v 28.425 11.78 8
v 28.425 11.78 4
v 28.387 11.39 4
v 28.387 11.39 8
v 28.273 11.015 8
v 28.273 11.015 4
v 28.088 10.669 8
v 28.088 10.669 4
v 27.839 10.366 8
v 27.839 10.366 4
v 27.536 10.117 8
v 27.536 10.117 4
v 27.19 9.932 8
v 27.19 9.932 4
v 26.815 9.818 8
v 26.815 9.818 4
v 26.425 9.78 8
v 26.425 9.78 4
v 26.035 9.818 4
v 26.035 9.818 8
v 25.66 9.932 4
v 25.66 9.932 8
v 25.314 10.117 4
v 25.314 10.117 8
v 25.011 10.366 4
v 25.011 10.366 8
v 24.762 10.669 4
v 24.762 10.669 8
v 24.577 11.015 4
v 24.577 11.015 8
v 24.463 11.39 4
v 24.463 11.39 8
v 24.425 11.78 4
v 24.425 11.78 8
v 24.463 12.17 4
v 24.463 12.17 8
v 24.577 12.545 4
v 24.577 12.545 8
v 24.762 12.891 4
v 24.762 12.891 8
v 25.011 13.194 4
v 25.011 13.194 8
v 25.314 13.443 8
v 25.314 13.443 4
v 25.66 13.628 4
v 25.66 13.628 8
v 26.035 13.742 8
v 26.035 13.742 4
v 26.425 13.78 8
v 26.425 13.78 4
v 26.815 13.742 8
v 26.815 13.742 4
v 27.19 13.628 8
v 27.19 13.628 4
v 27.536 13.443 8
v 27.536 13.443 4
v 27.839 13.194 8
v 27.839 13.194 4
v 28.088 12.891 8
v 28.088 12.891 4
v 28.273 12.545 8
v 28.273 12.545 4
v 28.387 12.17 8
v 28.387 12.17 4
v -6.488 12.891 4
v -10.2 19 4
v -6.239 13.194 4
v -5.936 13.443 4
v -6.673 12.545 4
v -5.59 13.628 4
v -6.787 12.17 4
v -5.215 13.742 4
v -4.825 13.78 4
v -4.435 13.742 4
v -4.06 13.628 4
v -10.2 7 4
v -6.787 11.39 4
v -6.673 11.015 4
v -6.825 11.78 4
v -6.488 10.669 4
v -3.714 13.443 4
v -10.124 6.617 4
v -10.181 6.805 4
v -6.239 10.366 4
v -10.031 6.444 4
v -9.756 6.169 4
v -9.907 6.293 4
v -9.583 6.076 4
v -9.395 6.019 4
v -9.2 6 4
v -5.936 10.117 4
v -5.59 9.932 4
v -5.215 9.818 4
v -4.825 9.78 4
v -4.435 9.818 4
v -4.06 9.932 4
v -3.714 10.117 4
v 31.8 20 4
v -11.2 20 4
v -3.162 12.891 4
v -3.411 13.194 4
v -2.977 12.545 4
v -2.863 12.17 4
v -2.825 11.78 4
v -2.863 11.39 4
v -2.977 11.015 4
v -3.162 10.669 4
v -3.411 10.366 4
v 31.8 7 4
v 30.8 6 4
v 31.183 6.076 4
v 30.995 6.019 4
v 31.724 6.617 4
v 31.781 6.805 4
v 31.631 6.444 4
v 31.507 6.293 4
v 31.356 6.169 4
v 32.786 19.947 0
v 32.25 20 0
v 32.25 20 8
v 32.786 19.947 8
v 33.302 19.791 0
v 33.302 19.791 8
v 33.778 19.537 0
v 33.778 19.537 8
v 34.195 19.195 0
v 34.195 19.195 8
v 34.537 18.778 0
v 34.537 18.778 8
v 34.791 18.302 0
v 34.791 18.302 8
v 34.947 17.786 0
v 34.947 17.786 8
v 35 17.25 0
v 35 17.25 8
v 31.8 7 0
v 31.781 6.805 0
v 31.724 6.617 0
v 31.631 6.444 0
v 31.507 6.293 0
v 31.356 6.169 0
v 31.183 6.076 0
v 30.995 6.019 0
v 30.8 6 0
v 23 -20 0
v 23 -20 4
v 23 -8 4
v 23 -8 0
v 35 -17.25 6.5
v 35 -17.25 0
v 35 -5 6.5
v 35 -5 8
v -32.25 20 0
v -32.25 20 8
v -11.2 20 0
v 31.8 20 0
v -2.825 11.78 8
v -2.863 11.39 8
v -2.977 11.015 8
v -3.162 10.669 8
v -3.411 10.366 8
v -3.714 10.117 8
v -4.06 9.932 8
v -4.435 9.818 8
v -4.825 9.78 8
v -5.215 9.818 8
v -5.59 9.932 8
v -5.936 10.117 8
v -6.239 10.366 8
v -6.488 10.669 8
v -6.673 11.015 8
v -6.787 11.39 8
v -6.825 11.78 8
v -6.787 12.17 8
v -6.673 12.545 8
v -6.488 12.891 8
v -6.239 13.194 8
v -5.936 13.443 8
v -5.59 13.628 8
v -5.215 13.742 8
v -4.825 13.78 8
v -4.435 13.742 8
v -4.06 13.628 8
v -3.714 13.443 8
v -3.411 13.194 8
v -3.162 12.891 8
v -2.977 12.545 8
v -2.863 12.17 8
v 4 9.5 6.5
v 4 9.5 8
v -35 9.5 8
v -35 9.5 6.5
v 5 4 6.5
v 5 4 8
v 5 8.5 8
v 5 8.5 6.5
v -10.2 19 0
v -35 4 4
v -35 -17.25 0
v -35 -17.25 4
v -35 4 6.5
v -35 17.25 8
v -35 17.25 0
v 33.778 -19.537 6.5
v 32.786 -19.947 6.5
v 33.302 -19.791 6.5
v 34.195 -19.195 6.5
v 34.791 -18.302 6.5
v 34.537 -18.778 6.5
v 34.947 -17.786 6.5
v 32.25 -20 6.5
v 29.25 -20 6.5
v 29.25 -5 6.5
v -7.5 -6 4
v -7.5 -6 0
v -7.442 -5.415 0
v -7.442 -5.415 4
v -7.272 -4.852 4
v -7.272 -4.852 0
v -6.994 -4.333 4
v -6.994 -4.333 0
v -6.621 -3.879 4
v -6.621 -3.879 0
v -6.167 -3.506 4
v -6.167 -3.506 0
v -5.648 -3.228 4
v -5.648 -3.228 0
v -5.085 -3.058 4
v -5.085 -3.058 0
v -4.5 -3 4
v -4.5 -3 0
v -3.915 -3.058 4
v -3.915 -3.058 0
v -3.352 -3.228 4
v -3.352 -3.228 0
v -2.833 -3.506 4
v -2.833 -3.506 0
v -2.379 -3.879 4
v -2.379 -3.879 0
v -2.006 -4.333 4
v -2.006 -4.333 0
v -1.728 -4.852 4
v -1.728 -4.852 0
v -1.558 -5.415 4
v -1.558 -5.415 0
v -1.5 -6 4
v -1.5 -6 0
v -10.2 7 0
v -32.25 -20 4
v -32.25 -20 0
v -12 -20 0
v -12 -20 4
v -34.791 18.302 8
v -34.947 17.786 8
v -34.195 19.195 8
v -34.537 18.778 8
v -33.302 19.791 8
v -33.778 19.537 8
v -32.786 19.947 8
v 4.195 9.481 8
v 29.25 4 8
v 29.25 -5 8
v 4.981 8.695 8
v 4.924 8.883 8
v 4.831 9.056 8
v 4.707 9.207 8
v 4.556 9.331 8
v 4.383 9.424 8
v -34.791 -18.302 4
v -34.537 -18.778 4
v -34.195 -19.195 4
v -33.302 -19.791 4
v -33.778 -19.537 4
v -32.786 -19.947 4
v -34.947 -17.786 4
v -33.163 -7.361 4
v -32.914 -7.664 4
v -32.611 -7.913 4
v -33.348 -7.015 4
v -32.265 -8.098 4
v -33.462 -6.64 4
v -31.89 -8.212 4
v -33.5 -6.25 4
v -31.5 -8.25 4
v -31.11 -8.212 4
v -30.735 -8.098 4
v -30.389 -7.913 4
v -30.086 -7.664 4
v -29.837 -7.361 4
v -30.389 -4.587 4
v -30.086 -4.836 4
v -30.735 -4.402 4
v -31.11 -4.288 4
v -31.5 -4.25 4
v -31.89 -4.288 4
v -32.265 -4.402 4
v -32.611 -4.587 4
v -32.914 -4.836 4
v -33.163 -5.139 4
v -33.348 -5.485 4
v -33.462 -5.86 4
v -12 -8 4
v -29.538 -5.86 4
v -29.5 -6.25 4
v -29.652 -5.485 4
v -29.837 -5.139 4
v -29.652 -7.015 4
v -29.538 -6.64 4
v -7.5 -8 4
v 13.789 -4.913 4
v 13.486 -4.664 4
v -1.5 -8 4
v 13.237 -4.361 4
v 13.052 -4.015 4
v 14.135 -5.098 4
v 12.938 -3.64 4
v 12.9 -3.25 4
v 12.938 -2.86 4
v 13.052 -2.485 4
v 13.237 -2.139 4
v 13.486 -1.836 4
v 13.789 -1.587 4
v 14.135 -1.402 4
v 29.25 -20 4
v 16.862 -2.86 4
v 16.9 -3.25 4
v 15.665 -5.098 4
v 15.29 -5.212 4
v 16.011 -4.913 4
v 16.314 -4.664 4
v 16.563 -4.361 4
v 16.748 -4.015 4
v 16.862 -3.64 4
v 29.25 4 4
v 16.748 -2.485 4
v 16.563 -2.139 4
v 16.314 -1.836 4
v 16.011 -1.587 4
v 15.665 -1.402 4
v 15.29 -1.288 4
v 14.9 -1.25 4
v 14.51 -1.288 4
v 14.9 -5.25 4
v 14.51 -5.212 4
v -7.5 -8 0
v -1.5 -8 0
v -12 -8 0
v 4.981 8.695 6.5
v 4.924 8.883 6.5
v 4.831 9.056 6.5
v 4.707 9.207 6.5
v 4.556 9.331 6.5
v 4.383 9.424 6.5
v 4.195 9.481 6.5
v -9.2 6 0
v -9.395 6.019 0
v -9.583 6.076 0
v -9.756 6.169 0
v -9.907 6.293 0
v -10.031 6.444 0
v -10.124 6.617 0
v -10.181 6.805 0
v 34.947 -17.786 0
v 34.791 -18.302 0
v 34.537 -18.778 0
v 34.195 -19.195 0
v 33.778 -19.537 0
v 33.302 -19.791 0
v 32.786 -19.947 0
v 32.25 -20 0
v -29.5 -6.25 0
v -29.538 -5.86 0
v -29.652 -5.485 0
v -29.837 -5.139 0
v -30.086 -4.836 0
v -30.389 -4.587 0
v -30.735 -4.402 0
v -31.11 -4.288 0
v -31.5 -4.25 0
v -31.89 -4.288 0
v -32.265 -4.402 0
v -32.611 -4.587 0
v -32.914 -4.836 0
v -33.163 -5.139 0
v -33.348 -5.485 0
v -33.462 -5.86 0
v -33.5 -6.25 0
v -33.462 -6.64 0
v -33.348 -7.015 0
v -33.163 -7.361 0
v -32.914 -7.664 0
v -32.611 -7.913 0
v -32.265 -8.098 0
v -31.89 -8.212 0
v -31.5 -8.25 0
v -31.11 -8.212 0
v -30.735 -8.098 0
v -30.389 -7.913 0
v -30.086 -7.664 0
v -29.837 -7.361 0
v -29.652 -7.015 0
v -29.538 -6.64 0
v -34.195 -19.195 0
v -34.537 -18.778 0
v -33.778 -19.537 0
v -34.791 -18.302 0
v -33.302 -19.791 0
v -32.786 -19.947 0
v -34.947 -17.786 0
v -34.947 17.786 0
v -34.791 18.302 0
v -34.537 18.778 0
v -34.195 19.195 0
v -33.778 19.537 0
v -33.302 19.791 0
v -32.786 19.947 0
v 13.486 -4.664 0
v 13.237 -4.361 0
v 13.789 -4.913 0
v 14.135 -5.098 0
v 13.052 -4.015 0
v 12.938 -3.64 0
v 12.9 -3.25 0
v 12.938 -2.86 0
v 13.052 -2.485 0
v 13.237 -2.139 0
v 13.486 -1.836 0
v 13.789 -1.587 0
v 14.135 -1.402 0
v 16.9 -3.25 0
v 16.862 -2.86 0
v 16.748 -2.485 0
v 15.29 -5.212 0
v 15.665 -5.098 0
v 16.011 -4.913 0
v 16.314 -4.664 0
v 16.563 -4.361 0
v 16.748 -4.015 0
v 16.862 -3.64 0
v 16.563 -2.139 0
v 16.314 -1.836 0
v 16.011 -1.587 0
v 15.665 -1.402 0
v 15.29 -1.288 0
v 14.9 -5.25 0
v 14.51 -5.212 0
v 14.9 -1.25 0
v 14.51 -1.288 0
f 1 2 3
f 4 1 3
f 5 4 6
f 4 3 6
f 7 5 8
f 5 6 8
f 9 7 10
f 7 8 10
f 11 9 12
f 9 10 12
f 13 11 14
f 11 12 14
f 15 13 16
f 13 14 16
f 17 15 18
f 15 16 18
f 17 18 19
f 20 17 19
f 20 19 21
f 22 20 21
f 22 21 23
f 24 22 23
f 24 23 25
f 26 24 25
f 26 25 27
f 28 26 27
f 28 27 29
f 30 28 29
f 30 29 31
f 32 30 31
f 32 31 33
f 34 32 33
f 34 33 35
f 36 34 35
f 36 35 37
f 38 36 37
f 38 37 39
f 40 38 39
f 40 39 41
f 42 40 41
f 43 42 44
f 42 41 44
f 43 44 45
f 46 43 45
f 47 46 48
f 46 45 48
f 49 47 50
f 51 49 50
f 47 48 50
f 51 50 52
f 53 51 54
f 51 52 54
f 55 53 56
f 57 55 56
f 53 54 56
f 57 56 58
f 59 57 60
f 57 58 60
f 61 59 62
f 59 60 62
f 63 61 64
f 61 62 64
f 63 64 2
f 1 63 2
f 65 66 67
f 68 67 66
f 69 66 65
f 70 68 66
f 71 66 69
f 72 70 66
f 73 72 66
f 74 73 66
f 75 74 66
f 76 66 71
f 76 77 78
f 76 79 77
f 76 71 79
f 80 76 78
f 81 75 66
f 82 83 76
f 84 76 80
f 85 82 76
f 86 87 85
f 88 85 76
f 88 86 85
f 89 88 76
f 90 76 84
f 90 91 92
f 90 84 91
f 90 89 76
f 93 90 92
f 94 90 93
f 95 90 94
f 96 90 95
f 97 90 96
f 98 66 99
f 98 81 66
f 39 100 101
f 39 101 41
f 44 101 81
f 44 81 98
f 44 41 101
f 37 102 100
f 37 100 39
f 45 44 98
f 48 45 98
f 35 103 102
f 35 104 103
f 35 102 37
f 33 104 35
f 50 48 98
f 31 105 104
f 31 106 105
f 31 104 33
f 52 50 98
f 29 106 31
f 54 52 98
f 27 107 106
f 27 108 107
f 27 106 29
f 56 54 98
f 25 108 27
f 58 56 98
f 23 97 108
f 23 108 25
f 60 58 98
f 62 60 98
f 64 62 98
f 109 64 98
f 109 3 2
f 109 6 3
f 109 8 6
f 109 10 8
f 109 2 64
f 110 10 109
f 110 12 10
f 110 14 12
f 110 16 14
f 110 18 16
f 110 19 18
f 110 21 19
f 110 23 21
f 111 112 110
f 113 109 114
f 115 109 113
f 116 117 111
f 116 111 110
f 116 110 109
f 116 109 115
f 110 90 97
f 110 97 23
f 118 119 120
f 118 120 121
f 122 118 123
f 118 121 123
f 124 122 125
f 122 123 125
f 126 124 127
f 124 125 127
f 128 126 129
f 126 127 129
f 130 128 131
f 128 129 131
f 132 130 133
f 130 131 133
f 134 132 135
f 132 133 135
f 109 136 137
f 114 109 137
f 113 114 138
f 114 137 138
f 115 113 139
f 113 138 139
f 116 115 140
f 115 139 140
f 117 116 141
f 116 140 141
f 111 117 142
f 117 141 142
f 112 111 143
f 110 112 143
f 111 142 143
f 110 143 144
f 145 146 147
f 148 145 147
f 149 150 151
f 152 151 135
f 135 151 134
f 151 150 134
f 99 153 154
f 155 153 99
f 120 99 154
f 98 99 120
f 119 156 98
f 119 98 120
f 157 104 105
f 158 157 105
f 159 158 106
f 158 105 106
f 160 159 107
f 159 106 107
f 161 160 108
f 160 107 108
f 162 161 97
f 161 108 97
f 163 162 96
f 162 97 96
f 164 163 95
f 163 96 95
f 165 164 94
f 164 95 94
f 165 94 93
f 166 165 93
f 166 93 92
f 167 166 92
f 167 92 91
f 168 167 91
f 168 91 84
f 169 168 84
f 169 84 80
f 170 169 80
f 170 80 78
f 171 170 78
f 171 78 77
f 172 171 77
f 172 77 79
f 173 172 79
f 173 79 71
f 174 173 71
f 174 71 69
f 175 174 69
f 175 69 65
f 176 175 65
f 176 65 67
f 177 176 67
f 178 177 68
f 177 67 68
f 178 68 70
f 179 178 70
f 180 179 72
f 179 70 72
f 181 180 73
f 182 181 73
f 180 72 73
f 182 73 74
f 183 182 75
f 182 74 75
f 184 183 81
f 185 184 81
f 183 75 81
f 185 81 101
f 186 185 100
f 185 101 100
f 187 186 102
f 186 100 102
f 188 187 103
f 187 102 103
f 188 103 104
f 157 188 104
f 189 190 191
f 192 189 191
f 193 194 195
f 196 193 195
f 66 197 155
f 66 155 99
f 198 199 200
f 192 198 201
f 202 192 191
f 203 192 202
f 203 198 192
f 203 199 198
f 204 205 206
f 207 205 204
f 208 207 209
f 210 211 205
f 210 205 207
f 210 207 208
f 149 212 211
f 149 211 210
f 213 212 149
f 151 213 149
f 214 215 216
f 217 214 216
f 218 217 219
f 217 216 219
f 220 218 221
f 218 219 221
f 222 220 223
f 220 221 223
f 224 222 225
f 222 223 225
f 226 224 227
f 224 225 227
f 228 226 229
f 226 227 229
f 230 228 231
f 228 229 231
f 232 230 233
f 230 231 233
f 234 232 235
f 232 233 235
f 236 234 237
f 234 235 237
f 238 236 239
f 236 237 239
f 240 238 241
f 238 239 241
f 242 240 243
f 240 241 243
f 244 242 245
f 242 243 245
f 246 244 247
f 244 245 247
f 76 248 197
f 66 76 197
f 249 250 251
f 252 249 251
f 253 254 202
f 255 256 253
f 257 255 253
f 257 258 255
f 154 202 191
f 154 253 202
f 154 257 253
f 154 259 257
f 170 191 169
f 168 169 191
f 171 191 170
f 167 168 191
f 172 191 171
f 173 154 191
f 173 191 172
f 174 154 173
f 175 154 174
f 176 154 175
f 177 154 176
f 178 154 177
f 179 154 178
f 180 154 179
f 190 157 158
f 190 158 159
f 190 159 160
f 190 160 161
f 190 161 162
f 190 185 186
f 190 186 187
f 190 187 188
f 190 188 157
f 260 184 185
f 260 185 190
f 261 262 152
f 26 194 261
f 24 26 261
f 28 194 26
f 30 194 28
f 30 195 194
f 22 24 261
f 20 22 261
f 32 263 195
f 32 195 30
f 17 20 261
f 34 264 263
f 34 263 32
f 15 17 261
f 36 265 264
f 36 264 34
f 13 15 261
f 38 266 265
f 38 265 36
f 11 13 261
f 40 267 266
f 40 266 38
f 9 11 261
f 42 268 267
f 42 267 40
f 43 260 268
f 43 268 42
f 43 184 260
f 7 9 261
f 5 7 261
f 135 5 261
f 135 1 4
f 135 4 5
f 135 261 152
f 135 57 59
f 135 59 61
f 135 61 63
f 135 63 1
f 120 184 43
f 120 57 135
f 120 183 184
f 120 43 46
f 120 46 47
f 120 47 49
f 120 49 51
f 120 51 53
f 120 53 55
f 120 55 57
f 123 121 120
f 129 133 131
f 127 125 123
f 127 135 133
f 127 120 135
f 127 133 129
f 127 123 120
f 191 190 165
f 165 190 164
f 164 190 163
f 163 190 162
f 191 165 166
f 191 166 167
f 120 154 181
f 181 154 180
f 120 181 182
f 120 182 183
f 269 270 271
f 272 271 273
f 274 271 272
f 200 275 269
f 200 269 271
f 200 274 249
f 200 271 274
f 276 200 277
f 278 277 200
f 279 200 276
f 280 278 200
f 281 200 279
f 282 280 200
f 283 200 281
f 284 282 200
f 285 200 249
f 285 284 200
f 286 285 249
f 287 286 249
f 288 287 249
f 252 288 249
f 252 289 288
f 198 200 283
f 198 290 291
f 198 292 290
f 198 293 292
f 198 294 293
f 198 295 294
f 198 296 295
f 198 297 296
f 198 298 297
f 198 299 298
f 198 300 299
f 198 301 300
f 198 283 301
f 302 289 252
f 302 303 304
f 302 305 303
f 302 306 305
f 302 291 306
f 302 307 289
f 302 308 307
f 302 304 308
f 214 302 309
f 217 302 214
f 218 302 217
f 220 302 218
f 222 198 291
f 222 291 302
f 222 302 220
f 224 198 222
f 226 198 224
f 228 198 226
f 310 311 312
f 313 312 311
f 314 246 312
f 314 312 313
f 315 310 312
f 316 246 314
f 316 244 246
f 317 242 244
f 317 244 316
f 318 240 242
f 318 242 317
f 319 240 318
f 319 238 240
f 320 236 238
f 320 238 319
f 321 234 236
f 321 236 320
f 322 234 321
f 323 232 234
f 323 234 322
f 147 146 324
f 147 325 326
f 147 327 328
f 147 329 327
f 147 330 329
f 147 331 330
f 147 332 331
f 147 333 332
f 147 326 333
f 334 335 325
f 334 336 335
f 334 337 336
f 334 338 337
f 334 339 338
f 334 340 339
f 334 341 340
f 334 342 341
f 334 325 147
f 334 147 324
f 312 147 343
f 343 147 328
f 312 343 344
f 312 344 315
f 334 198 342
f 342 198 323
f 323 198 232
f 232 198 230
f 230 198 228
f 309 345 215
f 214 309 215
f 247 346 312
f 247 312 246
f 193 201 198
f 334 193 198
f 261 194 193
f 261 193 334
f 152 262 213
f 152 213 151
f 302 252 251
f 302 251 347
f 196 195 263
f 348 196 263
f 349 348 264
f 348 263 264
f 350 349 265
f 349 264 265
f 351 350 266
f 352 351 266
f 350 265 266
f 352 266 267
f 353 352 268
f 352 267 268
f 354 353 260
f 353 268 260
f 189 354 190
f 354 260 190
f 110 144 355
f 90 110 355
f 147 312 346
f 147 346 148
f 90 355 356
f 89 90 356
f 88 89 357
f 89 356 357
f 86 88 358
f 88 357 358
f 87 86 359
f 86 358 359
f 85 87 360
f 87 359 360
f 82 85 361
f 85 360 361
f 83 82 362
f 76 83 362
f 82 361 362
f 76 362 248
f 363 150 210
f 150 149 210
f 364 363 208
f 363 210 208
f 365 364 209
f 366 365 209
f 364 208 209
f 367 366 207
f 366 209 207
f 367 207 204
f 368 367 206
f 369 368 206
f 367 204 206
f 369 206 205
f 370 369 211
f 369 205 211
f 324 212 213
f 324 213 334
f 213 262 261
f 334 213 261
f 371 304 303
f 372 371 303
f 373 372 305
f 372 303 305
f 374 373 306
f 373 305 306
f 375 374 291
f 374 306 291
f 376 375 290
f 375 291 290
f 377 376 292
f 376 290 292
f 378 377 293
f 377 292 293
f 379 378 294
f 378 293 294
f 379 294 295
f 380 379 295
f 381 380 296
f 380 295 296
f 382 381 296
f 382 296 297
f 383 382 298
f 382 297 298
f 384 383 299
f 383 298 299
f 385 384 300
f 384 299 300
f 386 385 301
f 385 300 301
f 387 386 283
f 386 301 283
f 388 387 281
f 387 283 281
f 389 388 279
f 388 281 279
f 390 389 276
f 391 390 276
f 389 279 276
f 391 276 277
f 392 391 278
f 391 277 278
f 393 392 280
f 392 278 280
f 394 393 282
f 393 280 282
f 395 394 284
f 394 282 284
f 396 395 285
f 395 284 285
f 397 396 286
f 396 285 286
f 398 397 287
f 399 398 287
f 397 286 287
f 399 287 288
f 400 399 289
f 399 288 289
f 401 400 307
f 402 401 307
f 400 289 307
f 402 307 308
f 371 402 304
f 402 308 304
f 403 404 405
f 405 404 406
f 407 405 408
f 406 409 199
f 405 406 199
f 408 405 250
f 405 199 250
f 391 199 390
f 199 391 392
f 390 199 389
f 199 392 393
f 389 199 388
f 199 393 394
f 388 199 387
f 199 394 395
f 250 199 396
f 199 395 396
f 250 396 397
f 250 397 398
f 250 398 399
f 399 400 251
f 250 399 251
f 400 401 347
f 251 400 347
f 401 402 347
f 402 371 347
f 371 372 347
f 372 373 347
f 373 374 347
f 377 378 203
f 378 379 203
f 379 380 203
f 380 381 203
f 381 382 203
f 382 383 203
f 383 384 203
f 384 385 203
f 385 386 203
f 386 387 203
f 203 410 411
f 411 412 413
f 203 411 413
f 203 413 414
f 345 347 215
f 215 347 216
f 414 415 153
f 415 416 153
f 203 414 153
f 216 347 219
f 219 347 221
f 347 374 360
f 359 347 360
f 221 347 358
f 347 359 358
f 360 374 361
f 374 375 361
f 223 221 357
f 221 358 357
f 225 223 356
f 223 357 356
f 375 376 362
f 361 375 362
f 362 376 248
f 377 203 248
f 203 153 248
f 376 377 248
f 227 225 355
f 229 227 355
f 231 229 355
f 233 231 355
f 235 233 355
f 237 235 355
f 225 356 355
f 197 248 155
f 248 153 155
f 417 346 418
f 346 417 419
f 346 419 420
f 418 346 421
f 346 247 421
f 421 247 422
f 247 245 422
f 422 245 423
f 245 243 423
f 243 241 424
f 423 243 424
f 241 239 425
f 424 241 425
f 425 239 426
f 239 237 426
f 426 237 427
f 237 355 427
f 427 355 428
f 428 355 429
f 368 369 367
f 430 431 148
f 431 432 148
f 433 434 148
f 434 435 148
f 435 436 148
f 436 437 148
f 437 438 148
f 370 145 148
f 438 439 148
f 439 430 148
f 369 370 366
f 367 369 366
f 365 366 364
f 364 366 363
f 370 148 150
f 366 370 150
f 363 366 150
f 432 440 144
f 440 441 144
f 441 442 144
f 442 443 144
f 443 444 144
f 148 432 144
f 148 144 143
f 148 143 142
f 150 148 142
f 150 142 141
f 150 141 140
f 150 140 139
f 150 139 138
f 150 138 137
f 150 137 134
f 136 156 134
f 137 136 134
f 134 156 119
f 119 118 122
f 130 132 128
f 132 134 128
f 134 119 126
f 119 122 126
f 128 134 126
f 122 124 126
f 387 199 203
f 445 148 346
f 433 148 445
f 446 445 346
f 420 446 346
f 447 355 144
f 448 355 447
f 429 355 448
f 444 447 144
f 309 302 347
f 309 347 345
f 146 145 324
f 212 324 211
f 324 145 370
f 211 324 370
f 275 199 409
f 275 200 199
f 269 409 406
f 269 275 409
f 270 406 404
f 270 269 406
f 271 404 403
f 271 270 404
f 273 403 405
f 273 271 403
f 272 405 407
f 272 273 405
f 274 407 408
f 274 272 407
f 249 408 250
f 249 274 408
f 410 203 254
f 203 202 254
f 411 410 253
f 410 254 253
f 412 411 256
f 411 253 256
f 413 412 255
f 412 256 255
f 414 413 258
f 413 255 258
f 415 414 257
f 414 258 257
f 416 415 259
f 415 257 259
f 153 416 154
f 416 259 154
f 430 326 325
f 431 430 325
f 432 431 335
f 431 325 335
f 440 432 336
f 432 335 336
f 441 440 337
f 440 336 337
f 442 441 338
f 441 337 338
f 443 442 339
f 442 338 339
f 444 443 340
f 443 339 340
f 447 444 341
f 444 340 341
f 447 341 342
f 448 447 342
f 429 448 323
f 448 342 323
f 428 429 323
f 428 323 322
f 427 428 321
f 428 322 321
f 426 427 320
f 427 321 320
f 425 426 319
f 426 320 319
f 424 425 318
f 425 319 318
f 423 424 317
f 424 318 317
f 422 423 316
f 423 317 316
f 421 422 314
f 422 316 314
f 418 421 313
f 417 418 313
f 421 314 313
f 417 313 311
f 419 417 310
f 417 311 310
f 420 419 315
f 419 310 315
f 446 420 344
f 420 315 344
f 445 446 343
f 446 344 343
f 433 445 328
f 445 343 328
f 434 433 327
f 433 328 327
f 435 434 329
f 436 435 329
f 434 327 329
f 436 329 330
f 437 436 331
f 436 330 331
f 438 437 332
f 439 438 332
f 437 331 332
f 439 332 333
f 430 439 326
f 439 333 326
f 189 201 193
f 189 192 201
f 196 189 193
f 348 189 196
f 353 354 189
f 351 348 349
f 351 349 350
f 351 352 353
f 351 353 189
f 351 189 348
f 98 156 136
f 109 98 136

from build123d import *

# Parameters (mm, degrees)
SKETCH_W             = 70
SKETCH_H             = 40
PAD_DEPTH            = 8
POCKET_DEPTH         = 4
SKETCH002_R          = 2
POCKET001_DEPTH      = 4.001
SKETCH003_W          = 64.25
SKETCH003_H          = 24
POCKET002_DEPTH      = 4
SKETCH004_R          = 2
POCKET003_DEPTH      = 4
SKETCH005_W          = 35
SKETCH005_H          = 12
POCKET004_DEPTH      = 4
POCKET005_DEPTH      = 8.001
SKETCH009_W          = 5.75
SKETCH009_H          = 15
POCKET006_DEPTH      = 1.5
FILLET_R             = 2.75
CHAMFER_SIZE         = 1
BODY_PLACEMENT_ANGLE = 90


with BuildPart() as part:
    # Sketch → Pad (new body)
    with BuildSketch(Plane.XZ):
        Rectangle(SKETCH_W, SKETCH_H)
    extrude(amount=PAD_DEPTH)

    # Sketch001 (on Face5 of Pad) → Pocket (cut)
    with BuildSketch(Plane(origin=(0, 0, 0), x_dir=(1, 0, 0), z_dir=(0, 1, 0))):
        with BuildLine():
            Line((31.8, -20), (31.8, -7))
            ThreePointArc((31.8, -7), (31.507107, -6.292893), (30.8, -6))
            Line((30.8, -6), (-9.2, -6))
            ThreePointArc((-9.2, -6), (-9.907107, -6.292893), (-10.2, -7))
            Line((-10.2, -7), (-10.2, -20))
            Line((-10.2, -20), (31.8, -20))
        make_face()
    extrude(amount=-POCKET_DEPTH, mode=Mode.SUBTRACT)

    # Sketch002 (on Face7 of Pocket) → Pocket001 (cut, through all)
    with BuildSketch(Plane(origin=(0, -4, 0), x_dir=(1, 0, 0), z_dir=(0, 1, 0))):
        with Locations((-4.825, -11.78)):
            Circle(SKETCH002_R)
        with Locations((26.425, -11.78)):
            Circle(SKETCH002_R)
    extrude(amount=-POCKET001_DEPTH, mode=Mode.SUBTRACT)

    # Sketch003 (on Face5 of Pocket001) → Pocket002 (cut)
    with BuildSketch(Plane.XZ.offset(8)):
        with Locations((-2.875, -8)):
            Rectangle(SKETCH003_W, SKETCH003_H)
    extrude(amount=-POCKET002_DEPTH, mode=Mode.SUBTRACT)

    # Sketch004 (on Face4 of Pocket002) → Pocket003 (cut)
    with BuildSketch(Plane.XZ.offset(4)):
        with Locations((14.9, -3.25)):
            Circle(SKETCH004_R)
        with Locations((-31.5, -6.25)):
            Circle(SKETCH004_R)
    extrude(amount=-POCKET003_DEPTH, mode=Mode.SUBTRACT)

    # Sketch005 (on Face4 of Pocket003) → Pocket004 (cut)
    with BuildSketch(Plane.XZ.offset(4)):
        with Locations((5.5, -14)):
            Rectangle(SKETCH005_W, SKETCH005_H)
    extrude(amount=-POCKET004_DEPTH, mode=Mode.SUBTRACT)

    # Sketch008 (on Face2 of Pocket004) → Pocket005 (cut, through all)
    with BuildSketch(Plane(origin=(0, 0, 0), x_dir=(1, 0, 0), z_dir=(0, 1, 0))):
        with BuildLine():
            ThreePointArc((-7.5, 6), (-4.5, 3), (-1.5, 6))
            Line((-1.5, 8), (-1.5, 6))
            Line((-7.5, 8), (-1.5, 8))
            Line((-7.5, 8), (-7.5, 6))
        make_face()
    extrude(amount=-POCKET005_DEPTH, mode=Mode.SUBTRACT)

    # Sketch009 (on Face6 of Pocket005) → Pocket006 (cut)
    with BuildSketch(Plane.XZ.offset(8)):
        with BuildLine():
            Line((-35, 4), (5, 4))
            Line((5, 4), (5, 8.5))
            ThreePointArc((5, 8.5), (4.707107, 9.207107), (4, 9.5))
            Line((4, 9.5), (-35, 9.5))
            Line((-35, 9.5), (-35, 4))
        make_face()
        with Locations((32.125, -12.5)):
            Rectangle(SKETCH009_W, SKETCH009_H)
    extrude(amount=-POCKET006_DEPTH, mode=Mode.SUBTRACT)

    # Fillet
    fillet_edges = [part.edges().sort_by_distance(p)[0] for p in [
        (35, -4, 20),
        (-35, -4, 20),
        (35, -3.25, -20),
        (-35, -2, -20),
    ]]
    fillet(fillet_edges, radius=FILLET_R)

    # Chamfer
    chamfer_edges = [part.edges().sort_by_distance(p)[0] for p in [
        (-10.2, -2, 20),
    ]]
    chamfer(chamfer_edges, length=CHAMFER_SIZE)


with BuildPart() as part_1:
    # Body placement: moved
    add(part.part.rotate(Axis((0, 0, 0), (-1, 0, 0)), BODY_PLACEMENT_ANGLE))


solid = part_1.part
